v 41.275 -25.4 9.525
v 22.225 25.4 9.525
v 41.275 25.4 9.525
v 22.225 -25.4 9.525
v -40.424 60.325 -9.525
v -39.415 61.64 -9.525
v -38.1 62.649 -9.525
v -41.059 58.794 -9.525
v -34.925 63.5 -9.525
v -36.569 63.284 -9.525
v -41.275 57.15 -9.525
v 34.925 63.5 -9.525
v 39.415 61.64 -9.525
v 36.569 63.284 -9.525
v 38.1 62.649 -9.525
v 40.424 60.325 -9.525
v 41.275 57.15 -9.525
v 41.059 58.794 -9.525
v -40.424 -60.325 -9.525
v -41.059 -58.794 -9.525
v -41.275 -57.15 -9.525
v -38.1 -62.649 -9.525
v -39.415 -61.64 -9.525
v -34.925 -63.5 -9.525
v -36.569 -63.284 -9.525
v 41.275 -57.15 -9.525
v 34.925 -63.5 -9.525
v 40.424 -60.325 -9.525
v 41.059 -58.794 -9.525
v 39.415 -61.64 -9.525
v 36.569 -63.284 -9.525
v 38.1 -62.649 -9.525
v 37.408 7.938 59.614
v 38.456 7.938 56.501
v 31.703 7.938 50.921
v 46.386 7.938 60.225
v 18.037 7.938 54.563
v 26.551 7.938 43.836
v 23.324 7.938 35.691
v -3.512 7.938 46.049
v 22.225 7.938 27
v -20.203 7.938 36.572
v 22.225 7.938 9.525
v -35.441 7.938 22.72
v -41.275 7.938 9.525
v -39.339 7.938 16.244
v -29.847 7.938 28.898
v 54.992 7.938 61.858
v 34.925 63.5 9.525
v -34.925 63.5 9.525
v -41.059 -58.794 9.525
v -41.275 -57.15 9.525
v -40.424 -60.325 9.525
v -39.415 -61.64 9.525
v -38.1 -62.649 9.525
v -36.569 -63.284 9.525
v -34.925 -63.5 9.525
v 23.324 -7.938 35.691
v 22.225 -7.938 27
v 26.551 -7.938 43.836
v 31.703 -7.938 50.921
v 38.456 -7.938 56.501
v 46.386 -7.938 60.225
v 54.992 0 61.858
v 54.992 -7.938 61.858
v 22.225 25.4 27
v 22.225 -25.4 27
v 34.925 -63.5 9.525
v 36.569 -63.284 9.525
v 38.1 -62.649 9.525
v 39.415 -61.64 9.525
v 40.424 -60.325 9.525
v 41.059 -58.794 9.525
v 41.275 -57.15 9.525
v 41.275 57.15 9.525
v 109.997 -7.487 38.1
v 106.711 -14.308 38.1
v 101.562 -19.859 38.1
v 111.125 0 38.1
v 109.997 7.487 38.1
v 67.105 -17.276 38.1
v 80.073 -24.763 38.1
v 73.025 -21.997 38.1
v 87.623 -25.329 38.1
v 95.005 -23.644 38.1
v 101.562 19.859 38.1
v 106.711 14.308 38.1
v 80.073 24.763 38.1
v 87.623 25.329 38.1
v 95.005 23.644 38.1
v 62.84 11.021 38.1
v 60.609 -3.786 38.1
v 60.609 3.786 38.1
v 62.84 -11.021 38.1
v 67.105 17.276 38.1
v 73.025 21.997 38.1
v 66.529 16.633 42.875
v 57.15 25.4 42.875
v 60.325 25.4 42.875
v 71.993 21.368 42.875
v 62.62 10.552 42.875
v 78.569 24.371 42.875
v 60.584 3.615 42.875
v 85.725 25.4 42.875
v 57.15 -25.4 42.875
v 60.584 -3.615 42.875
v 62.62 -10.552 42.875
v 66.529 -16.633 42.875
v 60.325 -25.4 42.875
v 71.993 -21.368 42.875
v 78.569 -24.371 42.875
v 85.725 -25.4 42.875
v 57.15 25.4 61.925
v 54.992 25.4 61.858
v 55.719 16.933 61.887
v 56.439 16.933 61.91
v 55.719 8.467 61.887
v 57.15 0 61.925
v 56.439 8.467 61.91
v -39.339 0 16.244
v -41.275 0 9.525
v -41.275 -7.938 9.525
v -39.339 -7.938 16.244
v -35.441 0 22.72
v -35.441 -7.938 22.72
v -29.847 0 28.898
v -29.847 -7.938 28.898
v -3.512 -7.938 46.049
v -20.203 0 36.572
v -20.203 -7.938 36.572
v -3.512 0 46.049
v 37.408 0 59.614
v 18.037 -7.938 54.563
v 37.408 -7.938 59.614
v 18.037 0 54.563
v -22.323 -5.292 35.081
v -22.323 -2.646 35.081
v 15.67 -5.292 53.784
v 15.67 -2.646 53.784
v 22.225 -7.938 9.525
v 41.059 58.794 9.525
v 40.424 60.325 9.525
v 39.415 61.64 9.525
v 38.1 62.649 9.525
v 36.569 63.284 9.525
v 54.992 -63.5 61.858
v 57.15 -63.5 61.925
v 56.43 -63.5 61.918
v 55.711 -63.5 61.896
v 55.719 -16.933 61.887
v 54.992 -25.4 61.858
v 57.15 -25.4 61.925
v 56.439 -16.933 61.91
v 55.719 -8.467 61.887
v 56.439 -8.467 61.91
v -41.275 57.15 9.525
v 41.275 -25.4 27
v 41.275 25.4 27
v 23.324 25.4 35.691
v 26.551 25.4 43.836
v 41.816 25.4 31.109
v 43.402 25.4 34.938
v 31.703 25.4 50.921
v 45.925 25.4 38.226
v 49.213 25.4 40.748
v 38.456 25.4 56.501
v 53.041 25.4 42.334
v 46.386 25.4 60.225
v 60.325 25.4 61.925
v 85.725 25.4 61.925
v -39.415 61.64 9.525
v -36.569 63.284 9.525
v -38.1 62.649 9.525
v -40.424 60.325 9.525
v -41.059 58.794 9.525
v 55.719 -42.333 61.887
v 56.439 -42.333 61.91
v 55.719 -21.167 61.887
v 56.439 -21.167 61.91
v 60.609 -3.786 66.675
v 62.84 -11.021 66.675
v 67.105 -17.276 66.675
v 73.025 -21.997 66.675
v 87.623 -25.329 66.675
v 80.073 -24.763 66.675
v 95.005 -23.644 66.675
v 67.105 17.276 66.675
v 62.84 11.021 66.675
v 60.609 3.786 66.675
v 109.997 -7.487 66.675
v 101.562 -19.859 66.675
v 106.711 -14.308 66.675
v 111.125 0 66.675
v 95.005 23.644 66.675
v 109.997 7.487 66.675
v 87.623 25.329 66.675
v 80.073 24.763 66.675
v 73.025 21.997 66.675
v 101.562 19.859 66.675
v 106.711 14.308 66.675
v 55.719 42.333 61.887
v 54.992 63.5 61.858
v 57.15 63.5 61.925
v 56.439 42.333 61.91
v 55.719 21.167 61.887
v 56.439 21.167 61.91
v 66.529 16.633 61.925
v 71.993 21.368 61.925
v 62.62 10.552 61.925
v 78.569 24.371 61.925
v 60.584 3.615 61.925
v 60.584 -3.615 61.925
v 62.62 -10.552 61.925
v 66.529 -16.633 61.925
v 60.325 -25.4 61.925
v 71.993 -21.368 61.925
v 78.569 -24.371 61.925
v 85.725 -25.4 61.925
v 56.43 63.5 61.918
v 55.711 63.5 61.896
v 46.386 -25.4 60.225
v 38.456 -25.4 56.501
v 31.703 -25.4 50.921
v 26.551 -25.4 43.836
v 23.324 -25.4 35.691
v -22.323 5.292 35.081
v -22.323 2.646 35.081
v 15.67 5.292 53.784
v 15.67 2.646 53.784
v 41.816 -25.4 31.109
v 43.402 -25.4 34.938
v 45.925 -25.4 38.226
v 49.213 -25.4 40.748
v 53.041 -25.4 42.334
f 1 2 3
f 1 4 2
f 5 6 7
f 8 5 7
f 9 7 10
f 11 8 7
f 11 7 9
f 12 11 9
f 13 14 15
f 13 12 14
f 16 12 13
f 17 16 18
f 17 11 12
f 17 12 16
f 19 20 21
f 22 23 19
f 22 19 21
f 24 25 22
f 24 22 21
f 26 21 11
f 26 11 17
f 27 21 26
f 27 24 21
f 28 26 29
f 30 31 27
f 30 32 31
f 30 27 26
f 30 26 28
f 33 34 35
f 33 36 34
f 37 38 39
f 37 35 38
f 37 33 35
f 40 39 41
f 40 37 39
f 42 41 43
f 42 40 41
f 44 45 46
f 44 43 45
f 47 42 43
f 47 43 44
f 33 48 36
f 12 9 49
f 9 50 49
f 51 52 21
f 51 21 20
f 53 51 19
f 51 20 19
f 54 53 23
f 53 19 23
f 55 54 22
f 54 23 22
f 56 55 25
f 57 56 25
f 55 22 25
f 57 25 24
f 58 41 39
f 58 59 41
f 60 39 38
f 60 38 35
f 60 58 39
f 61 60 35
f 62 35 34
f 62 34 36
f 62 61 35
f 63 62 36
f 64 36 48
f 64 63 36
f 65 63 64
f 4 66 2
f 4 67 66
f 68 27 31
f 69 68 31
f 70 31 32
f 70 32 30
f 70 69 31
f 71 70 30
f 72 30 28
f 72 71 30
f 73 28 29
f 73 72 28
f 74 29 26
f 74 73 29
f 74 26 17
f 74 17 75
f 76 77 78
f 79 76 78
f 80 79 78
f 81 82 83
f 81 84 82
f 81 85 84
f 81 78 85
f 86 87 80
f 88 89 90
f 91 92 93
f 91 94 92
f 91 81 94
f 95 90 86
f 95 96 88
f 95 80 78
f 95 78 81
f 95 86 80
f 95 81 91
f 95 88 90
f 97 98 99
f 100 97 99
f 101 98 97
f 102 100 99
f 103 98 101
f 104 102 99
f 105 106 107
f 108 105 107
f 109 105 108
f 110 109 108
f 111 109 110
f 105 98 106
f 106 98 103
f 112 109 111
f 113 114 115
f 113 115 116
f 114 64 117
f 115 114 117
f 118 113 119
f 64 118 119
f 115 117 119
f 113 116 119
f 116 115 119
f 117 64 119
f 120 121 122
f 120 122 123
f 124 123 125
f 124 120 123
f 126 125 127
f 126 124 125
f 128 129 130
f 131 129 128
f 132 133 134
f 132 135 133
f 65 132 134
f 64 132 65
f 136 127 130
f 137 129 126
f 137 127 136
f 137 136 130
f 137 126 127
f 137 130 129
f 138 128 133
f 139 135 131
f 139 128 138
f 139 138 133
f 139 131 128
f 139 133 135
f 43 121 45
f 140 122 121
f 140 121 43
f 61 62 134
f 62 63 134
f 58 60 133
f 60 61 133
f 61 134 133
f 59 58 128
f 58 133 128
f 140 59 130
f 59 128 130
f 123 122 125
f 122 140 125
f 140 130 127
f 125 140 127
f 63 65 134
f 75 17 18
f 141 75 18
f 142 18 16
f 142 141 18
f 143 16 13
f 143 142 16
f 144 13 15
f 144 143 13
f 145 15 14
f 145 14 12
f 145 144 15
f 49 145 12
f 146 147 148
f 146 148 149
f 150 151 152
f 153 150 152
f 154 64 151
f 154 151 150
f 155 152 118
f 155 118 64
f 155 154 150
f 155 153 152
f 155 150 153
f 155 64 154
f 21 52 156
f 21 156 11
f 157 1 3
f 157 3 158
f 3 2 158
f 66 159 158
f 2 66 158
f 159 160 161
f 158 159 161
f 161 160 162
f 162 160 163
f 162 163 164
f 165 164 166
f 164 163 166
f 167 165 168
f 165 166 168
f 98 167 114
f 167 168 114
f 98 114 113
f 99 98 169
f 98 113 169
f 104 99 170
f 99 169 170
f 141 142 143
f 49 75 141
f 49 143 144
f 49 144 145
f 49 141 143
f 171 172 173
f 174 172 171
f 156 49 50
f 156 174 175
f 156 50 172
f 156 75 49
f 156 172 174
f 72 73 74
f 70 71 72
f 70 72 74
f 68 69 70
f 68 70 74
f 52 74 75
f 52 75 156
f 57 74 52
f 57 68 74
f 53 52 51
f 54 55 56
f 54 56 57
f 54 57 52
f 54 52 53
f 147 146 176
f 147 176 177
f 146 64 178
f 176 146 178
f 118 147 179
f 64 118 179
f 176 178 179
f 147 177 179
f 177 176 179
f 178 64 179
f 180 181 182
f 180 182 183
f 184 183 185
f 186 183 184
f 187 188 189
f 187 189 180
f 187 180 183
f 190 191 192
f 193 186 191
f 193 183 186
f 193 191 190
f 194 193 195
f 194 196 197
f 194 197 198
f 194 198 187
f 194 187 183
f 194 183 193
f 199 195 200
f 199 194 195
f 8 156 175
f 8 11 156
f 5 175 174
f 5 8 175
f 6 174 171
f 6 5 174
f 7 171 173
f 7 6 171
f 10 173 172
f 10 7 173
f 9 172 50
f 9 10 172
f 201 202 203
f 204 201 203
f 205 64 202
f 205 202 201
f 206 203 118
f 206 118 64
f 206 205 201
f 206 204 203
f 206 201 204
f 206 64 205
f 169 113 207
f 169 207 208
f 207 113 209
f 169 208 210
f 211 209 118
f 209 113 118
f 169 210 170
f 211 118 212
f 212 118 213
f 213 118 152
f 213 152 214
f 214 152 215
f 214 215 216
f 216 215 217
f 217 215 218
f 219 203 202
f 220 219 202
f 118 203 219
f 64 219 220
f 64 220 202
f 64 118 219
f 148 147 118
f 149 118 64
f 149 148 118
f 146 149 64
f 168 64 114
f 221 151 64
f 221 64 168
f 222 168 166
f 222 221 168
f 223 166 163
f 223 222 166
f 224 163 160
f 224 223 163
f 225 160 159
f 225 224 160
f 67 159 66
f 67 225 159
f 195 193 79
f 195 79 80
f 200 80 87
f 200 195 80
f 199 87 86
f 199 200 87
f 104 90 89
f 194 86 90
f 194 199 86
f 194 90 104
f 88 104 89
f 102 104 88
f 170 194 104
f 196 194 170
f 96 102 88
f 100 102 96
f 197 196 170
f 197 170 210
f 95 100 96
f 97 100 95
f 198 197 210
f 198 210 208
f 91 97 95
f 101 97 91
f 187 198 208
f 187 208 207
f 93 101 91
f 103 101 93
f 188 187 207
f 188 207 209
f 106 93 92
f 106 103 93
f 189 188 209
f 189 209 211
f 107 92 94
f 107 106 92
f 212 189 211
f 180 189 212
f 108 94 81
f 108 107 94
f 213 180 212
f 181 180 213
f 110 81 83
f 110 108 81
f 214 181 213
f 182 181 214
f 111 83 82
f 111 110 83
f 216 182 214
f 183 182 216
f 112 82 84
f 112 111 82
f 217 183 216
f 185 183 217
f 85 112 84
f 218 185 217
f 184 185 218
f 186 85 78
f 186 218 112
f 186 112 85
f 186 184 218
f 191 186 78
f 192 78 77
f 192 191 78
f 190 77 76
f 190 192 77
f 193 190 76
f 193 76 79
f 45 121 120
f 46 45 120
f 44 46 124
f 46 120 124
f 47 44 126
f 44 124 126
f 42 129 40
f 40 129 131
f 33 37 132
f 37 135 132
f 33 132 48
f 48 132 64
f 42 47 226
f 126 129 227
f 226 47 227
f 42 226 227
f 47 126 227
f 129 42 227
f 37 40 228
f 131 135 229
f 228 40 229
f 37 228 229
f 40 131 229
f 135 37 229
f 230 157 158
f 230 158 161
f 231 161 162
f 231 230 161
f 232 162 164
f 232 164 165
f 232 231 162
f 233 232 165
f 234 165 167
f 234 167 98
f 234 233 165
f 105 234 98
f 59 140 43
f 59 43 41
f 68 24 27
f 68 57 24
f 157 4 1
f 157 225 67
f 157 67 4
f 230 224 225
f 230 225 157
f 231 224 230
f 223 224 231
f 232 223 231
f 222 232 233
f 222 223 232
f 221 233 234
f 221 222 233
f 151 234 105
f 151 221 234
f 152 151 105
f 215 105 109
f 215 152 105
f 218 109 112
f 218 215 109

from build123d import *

# Parameters (mm, degrees)
F1_DEPTH = 63.5
F0_W     = 25.4
F0_H     = 19.0500000095
F2_DEPTH = 25.4
F3_DEPTH = 7.9375
F5_R     = 6.35


with BuildPart() as f1:
    # F0 (on Front) → F1 (new body, symmetric)
    with BuildSketch(Plane.XZ):
        with BuildLine():
            ThreePointArc((57.15, 61.9252000095), (56.0706314791, 61.9085169067), (54.9922941517, 61.8584835368))
            add(Edge.make_bspline(
                [(54.9922941517, 61.8584835368), (55.7230926251, 61.8907108689), (56.4425898793, 61.9130055057), (57.15, 61.9252000095)],
                knots=[109.1637569367, 109.1637569367, 109.1637569367, 109.1637569367, 111.504536168, 111.504536168, 111.504536168, 111.504536168], degree=3))
        make_face()
    extrude(amount=F1_DEPTH, both=True)


with BuildPart() as f1b:
    # F0 (on Front) → F1, piece 2 (new body, symmetric)
    with BuildSketch(Plane.XZ):
        Polygon((-41.275, -9.525), (41.275, -9.525), (41.275, 9.525), (22.2249999905, 9.525), (-41.275, 9.525), align=None)
    extrude(amount=F1_DEPTH, both=True)

    # F5
    f5_edges = [f1b.edges().sort_by_distance(p)[0] for p in [
        (41.275, -63.5, 0),
        (41.275, 63.5, 0),
        (-41.275, 63.5, 0),
        (-41.275, -63.5, 0),
    ]]
    fillet(f5_edges, radius=F5_R)


with BuildPart() as f2:
    # F0 (on Front) → F2 (new body, symmetric)
    with BuildSketch(Plane.XZ):
        with BuildLine():
            Line((22.2249999905, 9.525), (41.275, 9.525))
            Line((41.275, 9.525), (41.275, 27.0002))
            ThreePointArc((41.275, 27.0002), (45.9246798487, 38.2255201513), (57.15, 42.8752))
            Line((57.15, 42.8752), (60.325, 42.8752))
            Line((60.325, 42.8752), (60.325, 61.9252000095))
            Line((60.325, 61.9252000095), (57.15, 61.9252000095))
            add(Edge.make_bspline(
                [(54.9922941517, 61.8584835368), (55.7230926251, 61.8907108689), (56.4425898793, 61.9130055057), (57.15, 61.9252000095)],
                knots=[109.1637569367, 109.1637569367, 109.1637569367, 109.1637569367, 111.504536168, 111.504536168, 111.504536168, 111.504536168], degree=3))
            ThreePointArc((54.9922941517, 61.8584835368), (31.702863595, 50.920878804), (22.2249999905, 27.0002))
            Line((22.2249999905, 27.0002), (22.2249999905, 9.525))
        make_face()
        with Locations((73.025, 52.4002000047)):
            Rectangle(F0_W, F0_H)
    extrude(amount=F2_DEPTH, both=True)

    # F0 (on Front) → F4 (revolve)
    with BuildSketch(Plane.XZ):
        Polygon((85.725, 61.9252000095), (85.725, 42.8752), (85.725, 38.1), (111.125, 38.1), (111.125, 66.675), (85.725, 66.675), align=None)
    revolve(axis=Axis((85.725, 0, 52.3875), (0, 0, 1)))


with BuildPart() as f3:
    # F0 (on Front) → F3 (new body, symmetric)
    with BuildSketch(Plane.XZ):
        with BuildLine():
            add(Edge.make_bspline(
                [(-41.275, 9.525), (-37.7490644721, 37.2501413938), (20.9110335802, 60.3555410121), (54.9922941517, 61.8584835368)],
                knots=[0, 0, 0, 0, 109.1637569367, 109.1637569367, 109.1637569367, 109.1637569367], degree=3))
            Line((-41.275, 9.525), (22.2249999905, 9.525))
            Line((22.2249999905, 9.525), (22.2249999905, 27.0002))
            ThreePointArc((22.2249999905, 27.0002), (31.702863595, 50.920878804), (54.9922941517, 61.8584835368))
        make_face()
    extrude(amount=F3_DEPTH, both=True)


solid = Compound([f1.part, f1b.part, f2.part, f3.part])
